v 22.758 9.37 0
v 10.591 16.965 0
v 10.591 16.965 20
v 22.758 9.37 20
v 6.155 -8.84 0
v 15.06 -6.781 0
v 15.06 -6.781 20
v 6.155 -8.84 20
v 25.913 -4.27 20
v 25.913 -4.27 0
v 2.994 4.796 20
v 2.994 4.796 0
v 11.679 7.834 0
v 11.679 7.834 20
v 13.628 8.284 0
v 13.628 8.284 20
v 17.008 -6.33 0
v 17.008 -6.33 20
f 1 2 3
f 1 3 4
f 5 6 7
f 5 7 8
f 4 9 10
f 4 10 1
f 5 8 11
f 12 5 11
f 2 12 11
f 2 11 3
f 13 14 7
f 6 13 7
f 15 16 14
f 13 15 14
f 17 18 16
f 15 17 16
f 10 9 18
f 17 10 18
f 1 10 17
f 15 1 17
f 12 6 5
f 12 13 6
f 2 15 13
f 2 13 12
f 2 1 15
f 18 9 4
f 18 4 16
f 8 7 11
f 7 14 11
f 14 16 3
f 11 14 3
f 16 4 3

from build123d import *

# Parameters (mm, degrees)
BOSS_EXTRU_1_DEPTH      = 20
ENL_V_MAT_EXTRU_1_DEPTH = 20
ENL_V_MAT_EXTRU_2_DEPTH = 20


with BuildPart() as part:
    # Esquisse1 → Boss.-Extru.1 (new body)
    with BuildSketch(Plane.XY):
        Polygon((0, 0), (10.591231248, 16.965430164), (27.556661412, 6.374198916), (29.810281051, -3.368552159), (2.257780804, -9.74178761), align=None)
    extrude(amount=BOSS_EXTRU_1_DEPTH)

    # Esquisse3 → Enlèv. mat.-Extru.1 (cut)
    with BuildSketch(Plane.XY.offset(20)):
        Polygon((15.059755827, -6.780531881), (17.008306042, -6.329807952), (13.627876577, 8.28431866), (11.679326362, 7.833594731), align=None)
    extrude(amount=-ENL_V_MAT_EXTRU_1_DEPTH, mode=Mode.SUBTRACT)

    # Esquisse4 → Enlèv. mat.-Extru.2 (cut)
    with BuildSketch(Plane.XY.offset(20)):
        Polygon((6.154881268, -8.8403399), (2.994373603, 4.796499582), (-5.37239396, 2.5559716), (0.883083606, -10.672172042), (6.394810123, -10.300296517), align=None)
        Polygon((25.913180592, -4.269999889), (22.758113126, 9.369851491), (37.693290305, 8.113830617), (39.464159746, -8.899165087), (30.389447251, -4.288402222), align=None)
    extrude(amount=-ENL_V_MAT_EXTRU_2_DEPTH, mode=Mode.SUBTRACT)


solid = part.part
